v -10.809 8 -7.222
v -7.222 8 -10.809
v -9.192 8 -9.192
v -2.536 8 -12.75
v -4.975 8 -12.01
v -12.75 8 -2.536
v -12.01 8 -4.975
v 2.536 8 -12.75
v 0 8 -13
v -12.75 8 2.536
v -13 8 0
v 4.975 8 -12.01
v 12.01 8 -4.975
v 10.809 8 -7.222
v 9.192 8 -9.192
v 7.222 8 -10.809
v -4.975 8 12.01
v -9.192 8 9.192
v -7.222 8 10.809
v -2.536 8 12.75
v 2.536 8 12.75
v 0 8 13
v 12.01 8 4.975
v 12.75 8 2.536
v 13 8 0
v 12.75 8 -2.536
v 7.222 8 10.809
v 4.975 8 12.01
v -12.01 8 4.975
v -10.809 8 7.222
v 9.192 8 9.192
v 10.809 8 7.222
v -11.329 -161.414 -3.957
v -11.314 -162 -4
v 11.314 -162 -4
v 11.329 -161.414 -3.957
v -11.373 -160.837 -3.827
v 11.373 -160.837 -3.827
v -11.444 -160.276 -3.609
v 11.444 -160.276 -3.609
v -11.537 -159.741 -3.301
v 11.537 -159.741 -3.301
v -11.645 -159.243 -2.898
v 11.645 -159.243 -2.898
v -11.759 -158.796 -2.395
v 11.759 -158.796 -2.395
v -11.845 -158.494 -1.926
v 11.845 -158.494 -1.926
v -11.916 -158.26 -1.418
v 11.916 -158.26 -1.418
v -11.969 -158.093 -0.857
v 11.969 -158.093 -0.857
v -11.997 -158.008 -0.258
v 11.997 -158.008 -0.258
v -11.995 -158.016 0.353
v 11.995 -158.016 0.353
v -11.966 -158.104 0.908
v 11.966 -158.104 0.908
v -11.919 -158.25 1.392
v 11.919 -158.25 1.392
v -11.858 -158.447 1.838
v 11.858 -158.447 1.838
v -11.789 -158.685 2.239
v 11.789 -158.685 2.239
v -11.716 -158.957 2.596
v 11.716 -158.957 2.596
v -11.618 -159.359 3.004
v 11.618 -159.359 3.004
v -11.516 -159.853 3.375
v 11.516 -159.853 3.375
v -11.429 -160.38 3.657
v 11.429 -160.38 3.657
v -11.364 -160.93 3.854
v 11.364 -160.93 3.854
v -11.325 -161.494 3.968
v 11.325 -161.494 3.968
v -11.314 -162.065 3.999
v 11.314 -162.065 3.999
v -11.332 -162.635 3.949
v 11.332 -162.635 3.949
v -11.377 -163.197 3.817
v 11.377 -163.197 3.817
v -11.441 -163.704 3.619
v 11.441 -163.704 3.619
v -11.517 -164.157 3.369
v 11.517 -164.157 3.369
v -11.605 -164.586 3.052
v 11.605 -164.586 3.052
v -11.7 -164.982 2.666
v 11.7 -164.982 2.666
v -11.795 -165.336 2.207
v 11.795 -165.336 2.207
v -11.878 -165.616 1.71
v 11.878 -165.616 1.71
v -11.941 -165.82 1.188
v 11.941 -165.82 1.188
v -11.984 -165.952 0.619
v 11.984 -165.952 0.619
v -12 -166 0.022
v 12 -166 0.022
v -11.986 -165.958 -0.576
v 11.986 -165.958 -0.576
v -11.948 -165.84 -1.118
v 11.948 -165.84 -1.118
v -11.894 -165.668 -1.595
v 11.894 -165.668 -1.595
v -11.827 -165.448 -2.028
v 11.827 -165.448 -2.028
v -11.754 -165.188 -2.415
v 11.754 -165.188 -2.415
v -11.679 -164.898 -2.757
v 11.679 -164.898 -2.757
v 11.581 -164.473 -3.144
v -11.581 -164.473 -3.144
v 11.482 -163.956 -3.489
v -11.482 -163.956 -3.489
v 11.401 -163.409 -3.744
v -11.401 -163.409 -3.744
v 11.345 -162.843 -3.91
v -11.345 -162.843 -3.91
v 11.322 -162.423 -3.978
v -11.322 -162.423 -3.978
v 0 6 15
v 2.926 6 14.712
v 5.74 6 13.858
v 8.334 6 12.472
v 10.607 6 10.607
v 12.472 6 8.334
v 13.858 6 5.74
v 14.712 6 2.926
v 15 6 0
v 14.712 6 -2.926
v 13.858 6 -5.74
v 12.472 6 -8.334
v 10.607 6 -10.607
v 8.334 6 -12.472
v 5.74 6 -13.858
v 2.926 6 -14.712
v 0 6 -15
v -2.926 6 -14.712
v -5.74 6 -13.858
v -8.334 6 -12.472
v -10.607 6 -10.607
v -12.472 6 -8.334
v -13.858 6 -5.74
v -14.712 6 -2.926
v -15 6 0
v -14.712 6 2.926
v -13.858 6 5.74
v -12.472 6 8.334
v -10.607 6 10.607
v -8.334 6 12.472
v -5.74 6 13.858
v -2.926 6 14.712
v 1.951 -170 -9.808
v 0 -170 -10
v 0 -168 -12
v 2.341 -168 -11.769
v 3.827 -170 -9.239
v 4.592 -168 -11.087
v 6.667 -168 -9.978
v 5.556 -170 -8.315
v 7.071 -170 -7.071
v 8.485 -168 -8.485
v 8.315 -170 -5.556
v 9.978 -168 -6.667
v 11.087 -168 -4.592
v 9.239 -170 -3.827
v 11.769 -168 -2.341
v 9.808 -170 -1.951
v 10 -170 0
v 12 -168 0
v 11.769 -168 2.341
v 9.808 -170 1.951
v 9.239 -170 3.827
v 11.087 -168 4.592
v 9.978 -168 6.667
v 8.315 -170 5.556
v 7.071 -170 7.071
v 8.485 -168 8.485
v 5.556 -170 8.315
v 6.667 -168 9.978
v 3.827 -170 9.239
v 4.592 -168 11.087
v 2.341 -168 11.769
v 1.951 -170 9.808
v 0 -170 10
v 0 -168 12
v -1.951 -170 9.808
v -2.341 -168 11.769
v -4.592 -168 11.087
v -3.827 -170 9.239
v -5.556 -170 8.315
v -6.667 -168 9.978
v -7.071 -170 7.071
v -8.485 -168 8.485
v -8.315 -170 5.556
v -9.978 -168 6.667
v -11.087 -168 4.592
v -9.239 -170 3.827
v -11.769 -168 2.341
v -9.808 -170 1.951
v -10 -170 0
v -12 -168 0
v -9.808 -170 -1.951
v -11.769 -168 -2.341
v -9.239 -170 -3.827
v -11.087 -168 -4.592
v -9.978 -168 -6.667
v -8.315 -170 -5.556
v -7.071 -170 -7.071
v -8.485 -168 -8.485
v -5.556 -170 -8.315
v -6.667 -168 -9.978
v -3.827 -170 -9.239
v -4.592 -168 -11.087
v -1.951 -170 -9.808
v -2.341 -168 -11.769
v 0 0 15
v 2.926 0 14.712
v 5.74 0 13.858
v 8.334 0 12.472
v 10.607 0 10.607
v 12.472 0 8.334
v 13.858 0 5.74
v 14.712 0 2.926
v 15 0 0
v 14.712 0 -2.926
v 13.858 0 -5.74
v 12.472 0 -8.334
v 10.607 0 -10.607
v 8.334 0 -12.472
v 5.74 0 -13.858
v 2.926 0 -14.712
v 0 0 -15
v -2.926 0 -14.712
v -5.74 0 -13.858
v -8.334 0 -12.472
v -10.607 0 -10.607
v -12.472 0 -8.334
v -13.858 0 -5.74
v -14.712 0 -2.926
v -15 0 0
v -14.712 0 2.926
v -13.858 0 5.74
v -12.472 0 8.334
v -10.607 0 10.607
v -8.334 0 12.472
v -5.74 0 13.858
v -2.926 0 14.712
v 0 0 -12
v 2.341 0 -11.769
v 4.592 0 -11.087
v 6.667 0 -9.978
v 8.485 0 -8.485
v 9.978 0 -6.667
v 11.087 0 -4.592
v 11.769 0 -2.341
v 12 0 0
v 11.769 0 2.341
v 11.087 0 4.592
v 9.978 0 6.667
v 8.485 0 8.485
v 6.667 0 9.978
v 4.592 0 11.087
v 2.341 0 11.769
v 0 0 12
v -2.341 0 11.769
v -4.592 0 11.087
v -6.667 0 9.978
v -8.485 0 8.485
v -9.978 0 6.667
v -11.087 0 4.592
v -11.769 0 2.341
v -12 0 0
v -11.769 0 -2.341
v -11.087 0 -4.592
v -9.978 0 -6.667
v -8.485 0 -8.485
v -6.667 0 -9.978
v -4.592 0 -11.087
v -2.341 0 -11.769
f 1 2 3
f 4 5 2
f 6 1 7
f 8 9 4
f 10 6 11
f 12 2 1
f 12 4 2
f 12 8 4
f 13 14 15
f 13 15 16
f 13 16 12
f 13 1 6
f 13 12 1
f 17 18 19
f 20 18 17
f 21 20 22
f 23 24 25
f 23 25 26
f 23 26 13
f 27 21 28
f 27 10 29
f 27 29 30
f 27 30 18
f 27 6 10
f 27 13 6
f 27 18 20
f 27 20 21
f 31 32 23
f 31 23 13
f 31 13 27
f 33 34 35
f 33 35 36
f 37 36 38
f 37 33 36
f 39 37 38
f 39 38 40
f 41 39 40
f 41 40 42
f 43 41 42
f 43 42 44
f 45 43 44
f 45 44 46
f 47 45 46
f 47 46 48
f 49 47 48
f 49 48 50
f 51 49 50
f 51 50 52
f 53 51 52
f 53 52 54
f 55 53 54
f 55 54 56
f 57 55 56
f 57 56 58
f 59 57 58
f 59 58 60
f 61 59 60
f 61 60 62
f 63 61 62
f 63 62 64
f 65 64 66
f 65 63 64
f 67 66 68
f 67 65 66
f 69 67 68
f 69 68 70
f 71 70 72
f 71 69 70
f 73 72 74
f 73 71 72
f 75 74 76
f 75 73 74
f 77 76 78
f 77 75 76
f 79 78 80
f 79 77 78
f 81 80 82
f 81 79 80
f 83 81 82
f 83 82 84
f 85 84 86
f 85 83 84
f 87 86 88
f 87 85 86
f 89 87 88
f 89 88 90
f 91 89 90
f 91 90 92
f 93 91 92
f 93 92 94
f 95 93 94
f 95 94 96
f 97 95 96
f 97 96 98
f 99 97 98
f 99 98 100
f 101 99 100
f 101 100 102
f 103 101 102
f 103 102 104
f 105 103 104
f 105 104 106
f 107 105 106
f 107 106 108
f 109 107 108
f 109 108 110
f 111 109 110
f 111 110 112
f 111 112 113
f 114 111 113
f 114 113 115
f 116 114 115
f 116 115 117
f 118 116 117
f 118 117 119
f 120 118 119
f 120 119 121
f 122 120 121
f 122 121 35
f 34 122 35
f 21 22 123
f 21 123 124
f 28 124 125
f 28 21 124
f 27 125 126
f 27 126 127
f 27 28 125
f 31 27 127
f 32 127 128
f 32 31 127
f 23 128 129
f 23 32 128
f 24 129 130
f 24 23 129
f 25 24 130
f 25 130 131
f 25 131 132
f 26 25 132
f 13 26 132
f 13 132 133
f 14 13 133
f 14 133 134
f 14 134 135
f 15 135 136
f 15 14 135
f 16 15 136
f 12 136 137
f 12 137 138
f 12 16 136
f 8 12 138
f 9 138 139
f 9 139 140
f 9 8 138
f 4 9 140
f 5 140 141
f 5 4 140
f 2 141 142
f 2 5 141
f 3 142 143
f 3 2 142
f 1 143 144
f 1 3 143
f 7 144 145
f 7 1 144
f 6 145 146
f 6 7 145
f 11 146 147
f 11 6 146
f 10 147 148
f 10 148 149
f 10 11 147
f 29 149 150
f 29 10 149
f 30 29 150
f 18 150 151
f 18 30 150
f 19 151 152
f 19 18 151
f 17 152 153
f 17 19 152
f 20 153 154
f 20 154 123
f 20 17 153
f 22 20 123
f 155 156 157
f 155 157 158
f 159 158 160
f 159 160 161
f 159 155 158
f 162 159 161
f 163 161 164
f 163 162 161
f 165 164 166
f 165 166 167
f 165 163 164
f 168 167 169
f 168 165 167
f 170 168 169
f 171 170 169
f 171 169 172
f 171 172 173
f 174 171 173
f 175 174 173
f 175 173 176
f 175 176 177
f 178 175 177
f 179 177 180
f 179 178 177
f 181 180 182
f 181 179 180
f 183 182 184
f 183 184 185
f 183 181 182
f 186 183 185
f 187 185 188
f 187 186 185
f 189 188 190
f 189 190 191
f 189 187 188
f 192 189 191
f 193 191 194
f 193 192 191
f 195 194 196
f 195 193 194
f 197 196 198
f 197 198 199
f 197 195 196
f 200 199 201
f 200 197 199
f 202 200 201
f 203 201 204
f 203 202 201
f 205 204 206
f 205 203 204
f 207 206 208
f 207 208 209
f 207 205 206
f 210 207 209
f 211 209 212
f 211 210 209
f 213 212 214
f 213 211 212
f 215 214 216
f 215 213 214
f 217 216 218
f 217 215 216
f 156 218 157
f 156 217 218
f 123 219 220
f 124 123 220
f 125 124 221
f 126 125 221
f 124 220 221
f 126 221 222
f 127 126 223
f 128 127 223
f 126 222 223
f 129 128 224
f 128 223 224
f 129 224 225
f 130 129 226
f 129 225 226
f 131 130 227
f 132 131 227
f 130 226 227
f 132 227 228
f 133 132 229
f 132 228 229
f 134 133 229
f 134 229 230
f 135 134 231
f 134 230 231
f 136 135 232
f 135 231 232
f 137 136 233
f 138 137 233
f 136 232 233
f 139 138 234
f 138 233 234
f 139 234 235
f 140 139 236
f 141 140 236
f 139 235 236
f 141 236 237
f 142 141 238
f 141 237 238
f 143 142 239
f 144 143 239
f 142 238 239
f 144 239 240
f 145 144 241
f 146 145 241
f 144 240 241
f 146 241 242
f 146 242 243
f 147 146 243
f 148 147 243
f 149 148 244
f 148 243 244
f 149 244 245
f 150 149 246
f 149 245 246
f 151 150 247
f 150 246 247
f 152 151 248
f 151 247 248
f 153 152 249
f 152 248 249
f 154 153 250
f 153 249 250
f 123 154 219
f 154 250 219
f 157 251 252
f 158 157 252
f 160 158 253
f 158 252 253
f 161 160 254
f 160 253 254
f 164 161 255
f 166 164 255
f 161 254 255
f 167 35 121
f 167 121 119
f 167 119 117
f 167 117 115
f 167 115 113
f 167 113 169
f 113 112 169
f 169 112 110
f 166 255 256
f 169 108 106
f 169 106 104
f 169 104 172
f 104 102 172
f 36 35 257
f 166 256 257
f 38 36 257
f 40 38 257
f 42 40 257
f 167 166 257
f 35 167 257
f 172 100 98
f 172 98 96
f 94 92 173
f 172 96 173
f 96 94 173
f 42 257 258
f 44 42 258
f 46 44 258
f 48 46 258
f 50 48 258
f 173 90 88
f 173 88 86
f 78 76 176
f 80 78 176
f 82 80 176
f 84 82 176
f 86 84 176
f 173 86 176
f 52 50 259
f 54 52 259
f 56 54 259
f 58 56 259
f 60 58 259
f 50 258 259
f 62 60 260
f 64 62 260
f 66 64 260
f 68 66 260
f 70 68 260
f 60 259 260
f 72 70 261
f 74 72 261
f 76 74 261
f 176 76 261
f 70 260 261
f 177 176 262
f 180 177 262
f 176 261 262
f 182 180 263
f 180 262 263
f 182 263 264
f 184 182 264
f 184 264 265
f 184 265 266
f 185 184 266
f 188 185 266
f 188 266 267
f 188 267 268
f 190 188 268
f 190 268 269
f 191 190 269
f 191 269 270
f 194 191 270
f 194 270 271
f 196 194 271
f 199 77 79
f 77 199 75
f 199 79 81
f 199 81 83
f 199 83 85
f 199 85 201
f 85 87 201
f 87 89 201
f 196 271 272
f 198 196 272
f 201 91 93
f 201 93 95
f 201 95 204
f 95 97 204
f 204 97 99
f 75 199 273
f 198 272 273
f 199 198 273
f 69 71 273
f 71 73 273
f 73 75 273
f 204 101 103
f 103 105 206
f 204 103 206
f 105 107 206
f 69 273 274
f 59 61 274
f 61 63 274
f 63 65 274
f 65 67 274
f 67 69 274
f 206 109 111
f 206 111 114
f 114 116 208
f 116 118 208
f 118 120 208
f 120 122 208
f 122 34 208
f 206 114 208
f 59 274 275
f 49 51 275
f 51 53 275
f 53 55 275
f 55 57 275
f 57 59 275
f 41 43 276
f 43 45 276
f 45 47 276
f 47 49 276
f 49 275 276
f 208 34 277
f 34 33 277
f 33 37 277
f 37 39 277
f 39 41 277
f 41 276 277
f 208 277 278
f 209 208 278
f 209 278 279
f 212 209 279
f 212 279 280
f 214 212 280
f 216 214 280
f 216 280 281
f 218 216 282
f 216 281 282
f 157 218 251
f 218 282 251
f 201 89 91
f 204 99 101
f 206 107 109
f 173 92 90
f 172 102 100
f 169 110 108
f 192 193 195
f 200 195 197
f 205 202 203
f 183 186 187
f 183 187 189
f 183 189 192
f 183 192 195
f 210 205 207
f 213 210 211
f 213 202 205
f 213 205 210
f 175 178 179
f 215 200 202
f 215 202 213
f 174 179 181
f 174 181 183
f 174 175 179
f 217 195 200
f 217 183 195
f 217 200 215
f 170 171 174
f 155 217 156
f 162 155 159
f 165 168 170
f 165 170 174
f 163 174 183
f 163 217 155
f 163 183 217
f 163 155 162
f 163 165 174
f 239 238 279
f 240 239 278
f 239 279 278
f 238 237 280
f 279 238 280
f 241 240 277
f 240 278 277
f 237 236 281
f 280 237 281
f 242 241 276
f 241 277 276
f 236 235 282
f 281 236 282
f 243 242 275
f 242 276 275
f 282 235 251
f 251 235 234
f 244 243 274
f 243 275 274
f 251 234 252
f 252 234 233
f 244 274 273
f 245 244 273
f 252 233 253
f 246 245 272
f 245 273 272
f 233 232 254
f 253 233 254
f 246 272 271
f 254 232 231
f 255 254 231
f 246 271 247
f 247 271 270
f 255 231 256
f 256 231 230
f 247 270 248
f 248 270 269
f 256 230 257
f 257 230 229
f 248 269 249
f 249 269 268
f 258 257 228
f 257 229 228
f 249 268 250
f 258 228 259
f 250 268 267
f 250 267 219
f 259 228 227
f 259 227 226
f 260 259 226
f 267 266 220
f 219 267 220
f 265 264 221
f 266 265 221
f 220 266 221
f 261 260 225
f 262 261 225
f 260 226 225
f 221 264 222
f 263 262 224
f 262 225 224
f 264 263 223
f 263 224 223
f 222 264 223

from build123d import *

# Parameters (mm, degrees)
SKETCH1_R           = 15
EXTRUDE1_DEPTH      = 8
SKETCH2_R           = 12
EXTRUDE2_DEPTH      = 170
EXTRUDE3_DEPTH      = 172.31841699
EXTRUDE3_DEPTH_BACK = 172.31841699
SKETCH3_R           = 4
CHAMFER1_SIZE       = 2


with BuildPart() as part:
    # Sketch1 → Extrude1 (new body)
    with BuildSketch(Plane(origin=(0, 0, 0), x_dir=(1, 0, 0), z_dir=(0, 1, 0))):
        with Locations(Location((0, 0, 0), (0, 0, 270))):
            Circle(SKETCH1_R)
    extrude(amount=EXTRUDE1_DEPTH)

    # Sketch2 → Extrude2 (add)
    with BuildSketch(Plane.XZ):
        with Locations(Location((0, 0, 0), (0, 0, 270))):
            Circle(SKETCH2_R)
    extrude(amount=EXTRUDE2_DEPTH)

    # Sketch3 → Extrude3 (cut, two sides: drawn at the far end of the back side and taken through both)
    with BuildSketch(Plane(origin=(0, 0, 0), x_dir=(0, 0, -1), z_dir=(1, 0, 0)).offset(-EXTRUDE3_DEPTH_BACK)):
        with Locations((0, -162)):
            Circle(SKETCH3_R)
    extrude(amount=EXTRUDE3_DEPTH + EXTRUDE3_DEPTH_BACK, mode=Mode.SUBTRACT)

    # Chamfer1
    chamfer1_edges = [part.edges().sort_by_distance(p)[0] for p in [
        (0, 8, -15),
        (0, -170, 12),
    ]]
    chamfer(chamfer1_edges, length=CHAMFER1_SIZE)


solid = part.part
